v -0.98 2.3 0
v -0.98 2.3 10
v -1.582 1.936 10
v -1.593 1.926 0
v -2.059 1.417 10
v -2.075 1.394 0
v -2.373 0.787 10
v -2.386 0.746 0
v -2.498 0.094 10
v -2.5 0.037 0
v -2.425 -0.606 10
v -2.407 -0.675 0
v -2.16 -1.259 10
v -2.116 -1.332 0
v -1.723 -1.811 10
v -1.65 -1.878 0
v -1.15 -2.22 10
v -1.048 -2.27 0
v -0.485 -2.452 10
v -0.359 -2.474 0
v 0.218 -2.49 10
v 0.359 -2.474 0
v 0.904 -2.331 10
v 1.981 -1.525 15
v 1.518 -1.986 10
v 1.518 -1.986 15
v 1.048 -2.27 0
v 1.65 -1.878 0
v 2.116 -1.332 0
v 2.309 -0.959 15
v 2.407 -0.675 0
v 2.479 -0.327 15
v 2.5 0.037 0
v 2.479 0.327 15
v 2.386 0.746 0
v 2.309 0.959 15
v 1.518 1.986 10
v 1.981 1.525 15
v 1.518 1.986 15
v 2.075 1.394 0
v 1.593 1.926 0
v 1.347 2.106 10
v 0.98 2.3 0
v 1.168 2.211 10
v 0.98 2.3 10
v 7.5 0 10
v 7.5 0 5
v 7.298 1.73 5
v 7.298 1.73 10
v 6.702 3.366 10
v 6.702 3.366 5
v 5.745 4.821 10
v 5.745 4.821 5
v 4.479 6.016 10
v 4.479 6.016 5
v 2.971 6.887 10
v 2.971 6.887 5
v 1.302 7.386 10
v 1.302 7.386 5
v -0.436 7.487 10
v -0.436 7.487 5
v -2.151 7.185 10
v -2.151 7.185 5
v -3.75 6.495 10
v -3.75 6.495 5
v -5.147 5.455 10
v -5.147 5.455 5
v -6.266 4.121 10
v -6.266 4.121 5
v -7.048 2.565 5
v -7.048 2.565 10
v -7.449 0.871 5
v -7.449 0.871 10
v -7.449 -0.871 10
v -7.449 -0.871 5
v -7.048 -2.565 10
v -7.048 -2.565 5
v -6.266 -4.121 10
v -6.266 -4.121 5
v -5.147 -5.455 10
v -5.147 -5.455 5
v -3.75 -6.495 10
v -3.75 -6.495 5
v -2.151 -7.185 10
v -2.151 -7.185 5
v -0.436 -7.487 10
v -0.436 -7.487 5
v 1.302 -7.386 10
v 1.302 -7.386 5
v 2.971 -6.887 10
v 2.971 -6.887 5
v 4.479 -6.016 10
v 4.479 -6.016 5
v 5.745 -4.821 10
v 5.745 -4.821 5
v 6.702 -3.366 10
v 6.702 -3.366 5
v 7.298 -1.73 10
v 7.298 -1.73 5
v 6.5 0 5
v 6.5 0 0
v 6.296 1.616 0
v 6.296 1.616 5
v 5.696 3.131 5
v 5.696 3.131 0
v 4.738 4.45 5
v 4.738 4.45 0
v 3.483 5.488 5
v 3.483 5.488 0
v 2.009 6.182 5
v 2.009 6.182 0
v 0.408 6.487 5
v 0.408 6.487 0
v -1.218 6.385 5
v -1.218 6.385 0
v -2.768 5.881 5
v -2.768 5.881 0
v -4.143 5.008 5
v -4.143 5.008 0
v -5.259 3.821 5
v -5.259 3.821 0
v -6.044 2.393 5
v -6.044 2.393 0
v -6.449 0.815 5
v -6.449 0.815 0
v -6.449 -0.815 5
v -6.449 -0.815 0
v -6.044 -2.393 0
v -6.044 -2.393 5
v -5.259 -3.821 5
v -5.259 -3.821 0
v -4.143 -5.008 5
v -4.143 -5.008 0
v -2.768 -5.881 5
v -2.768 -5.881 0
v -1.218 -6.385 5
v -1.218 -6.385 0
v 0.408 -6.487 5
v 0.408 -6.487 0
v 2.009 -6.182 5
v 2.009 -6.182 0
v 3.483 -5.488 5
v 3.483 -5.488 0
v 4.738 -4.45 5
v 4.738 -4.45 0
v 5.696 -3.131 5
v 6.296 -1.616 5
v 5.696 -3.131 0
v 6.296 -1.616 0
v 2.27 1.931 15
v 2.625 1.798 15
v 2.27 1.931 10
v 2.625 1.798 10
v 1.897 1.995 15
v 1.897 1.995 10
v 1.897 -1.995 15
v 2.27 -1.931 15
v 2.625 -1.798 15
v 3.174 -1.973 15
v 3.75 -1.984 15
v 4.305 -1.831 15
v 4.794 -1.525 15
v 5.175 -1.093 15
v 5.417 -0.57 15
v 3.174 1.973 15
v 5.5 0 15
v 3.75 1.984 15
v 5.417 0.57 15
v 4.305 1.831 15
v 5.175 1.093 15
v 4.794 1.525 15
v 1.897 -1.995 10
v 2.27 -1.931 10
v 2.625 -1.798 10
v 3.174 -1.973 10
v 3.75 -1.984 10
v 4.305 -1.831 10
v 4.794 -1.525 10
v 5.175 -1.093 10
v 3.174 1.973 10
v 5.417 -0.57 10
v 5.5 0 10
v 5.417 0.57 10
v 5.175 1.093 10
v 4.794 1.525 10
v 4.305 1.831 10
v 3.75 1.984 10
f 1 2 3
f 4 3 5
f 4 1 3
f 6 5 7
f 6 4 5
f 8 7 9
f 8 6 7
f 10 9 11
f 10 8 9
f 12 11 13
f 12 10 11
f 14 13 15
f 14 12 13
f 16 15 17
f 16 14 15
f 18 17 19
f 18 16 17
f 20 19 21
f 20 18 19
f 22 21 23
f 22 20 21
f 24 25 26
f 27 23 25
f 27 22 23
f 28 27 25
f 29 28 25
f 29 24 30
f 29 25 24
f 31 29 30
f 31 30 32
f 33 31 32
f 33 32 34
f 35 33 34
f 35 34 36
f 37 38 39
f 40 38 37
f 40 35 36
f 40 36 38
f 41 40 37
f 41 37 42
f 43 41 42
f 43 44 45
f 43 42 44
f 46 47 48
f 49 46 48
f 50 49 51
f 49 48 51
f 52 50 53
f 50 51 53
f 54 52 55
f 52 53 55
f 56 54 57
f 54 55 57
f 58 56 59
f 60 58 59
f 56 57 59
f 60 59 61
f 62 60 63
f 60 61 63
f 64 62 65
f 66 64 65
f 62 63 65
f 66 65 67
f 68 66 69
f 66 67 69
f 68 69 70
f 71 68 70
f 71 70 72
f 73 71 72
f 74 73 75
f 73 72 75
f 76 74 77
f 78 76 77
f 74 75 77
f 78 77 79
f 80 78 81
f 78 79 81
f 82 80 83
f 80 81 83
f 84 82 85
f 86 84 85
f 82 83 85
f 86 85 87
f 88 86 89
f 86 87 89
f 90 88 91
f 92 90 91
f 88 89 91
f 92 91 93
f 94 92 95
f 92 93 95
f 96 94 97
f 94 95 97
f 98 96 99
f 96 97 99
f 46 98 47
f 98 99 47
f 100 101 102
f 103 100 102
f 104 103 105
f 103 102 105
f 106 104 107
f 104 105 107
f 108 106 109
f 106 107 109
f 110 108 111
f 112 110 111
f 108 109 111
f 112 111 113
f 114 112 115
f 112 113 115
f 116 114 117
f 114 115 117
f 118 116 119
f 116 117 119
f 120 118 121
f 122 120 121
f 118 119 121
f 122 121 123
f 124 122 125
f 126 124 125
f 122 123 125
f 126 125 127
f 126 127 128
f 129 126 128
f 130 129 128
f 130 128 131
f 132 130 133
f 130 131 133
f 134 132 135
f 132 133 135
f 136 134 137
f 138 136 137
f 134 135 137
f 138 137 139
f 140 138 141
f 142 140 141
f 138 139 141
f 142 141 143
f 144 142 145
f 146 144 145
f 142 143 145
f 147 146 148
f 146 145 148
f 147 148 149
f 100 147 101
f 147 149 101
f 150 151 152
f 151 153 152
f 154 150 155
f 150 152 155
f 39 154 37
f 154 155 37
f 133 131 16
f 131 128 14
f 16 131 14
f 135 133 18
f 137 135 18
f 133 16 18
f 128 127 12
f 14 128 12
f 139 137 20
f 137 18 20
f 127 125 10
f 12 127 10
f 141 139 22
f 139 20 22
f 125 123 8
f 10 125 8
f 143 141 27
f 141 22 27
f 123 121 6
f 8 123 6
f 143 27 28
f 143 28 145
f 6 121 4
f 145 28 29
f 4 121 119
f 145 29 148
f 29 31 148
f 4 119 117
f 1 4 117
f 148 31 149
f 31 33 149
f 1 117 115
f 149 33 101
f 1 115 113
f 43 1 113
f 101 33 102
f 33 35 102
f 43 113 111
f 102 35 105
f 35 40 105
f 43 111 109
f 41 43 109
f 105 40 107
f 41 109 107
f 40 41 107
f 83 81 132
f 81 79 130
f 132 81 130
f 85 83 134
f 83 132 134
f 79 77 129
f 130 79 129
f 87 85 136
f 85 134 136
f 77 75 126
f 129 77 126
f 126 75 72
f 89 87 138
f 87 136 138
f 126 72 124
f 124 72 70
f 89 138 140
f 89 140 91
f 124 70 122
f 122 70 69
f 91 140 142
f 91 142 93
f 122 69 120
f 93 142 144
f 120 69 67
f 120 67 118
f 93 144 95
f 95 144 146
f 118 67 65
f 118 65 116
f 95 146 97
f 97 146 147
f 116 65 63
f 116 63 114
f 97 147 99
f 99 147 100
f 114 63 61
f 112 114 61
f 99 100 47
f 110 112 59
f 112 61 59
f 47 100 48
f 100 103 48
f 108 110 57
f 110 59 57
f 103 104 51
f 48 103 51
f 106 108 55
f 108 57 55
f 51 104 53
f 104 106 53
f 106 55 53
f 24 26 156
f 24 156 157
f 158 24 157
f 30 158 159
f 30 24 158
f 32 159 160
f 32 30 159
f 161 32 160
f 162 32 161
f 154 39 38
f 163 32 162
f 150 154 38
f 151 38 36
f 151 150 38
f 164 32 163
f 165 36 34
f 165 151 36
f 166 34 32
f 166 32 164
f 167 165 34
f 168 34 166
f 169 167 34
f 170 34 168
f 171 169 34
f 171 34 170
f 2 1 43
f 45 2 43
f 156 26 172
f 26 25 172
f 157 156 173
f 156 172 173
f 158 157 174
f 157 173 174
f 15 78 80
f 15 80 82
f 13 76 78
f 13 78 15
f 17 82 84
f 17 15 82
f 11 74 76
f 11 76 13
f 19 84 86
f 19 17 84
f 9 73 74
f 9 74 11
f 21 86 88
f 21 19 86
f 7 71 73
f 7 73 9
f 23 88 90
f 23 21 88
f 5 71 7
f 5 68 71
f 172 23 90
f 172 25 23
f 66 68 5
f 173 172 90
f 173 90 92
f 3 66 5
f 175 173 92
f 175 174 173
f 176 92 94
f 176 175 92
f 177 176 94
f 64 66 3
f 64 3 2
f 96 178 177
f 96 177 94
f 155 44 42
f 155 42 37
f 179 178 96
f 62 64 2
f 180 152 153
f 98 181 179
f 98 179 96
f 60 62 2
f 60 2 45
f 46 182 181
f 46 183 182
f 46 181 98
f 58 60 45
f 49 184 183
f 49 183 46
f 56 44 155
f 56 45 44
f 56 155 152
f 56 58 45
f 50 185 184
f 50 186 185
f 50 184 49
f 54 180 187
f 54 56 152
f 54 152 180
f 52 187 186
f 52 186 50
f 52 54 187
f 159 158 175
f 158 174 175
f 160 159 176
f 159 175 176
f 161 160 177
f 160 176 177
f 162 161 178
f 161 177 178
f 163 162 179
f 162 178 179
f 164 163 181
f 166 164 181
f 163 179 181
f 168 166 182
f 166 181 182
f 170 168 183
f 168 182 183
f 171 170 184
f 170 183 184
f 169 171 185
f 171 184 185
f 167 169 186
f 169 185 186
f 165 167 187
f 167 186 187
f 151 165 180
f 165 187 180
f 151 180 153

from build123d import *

# Parameters (mm, degrees)
SHAFTSKETCH_R           = 6.5
BEARINGHOLEPAD_DEPTH    = 5
SHAFT1SKETCH_R          = 7.5
SHAFTABOVEBASEPAD_DEPTH = 5
PIN1SKETCH_R            = 2
PIN1PAD_DEPTH           = 10
PIN2SKETCH_R            = 2
PIN2PAD_DEPTH           = 10
INPUTKEYPOCKET_DEPTH    = 15


with BuildPart() as part:
    # ShaftSketch → bearingholePad (new body)
    with BuildSketch(Plane.XY):
        Circle(SHAFTSKETCH_R)
    extrude(amount=BEARINGHOLEPAD_DEPTH)

    # Shaft1Sketch → shaftabovebasePad (join)
    with BuildSketch(Plane.XY.offset(5)):
        Circle(SHAFT1SKETCH_R)
    extrude(amount=SHAFTABOVEBASEPAD_DEPTH)

    # Pin1Sketch → Pin1Pad (join)
    with BuildSketch(Plane.XY.offset(5)):
        with Locations((1.75, 0)):
            Circle(PIN1SKETCH_R)
    extrude(amount=PIN1PAD_DEPTH)

    # Pin2Sketch → Pin2Pad (join)
    with BuildSketch(Plane.XY.offset(5)):
        with Locations((3.5, 0)):
            Circle(PIN2SKETCH_R)
    extrude(amount=PIN2PAD_DEPTH)

    # InputKeySketch → InputKeyPocket (cut)
    with BuildSketch(Plane.XY):
        with BuildLine():
            ThreePointArc((-0.979796, 2.3), (0, -2.5), (0.979796, 2.3))
            Line((-0.979796, 2.3), (0.979796, 2.3))
        make_face()
    extrude(amount=INPUTKEYPOCKET_DEPTH, mode=Mode.SUBTRACT)


solid = part.part
